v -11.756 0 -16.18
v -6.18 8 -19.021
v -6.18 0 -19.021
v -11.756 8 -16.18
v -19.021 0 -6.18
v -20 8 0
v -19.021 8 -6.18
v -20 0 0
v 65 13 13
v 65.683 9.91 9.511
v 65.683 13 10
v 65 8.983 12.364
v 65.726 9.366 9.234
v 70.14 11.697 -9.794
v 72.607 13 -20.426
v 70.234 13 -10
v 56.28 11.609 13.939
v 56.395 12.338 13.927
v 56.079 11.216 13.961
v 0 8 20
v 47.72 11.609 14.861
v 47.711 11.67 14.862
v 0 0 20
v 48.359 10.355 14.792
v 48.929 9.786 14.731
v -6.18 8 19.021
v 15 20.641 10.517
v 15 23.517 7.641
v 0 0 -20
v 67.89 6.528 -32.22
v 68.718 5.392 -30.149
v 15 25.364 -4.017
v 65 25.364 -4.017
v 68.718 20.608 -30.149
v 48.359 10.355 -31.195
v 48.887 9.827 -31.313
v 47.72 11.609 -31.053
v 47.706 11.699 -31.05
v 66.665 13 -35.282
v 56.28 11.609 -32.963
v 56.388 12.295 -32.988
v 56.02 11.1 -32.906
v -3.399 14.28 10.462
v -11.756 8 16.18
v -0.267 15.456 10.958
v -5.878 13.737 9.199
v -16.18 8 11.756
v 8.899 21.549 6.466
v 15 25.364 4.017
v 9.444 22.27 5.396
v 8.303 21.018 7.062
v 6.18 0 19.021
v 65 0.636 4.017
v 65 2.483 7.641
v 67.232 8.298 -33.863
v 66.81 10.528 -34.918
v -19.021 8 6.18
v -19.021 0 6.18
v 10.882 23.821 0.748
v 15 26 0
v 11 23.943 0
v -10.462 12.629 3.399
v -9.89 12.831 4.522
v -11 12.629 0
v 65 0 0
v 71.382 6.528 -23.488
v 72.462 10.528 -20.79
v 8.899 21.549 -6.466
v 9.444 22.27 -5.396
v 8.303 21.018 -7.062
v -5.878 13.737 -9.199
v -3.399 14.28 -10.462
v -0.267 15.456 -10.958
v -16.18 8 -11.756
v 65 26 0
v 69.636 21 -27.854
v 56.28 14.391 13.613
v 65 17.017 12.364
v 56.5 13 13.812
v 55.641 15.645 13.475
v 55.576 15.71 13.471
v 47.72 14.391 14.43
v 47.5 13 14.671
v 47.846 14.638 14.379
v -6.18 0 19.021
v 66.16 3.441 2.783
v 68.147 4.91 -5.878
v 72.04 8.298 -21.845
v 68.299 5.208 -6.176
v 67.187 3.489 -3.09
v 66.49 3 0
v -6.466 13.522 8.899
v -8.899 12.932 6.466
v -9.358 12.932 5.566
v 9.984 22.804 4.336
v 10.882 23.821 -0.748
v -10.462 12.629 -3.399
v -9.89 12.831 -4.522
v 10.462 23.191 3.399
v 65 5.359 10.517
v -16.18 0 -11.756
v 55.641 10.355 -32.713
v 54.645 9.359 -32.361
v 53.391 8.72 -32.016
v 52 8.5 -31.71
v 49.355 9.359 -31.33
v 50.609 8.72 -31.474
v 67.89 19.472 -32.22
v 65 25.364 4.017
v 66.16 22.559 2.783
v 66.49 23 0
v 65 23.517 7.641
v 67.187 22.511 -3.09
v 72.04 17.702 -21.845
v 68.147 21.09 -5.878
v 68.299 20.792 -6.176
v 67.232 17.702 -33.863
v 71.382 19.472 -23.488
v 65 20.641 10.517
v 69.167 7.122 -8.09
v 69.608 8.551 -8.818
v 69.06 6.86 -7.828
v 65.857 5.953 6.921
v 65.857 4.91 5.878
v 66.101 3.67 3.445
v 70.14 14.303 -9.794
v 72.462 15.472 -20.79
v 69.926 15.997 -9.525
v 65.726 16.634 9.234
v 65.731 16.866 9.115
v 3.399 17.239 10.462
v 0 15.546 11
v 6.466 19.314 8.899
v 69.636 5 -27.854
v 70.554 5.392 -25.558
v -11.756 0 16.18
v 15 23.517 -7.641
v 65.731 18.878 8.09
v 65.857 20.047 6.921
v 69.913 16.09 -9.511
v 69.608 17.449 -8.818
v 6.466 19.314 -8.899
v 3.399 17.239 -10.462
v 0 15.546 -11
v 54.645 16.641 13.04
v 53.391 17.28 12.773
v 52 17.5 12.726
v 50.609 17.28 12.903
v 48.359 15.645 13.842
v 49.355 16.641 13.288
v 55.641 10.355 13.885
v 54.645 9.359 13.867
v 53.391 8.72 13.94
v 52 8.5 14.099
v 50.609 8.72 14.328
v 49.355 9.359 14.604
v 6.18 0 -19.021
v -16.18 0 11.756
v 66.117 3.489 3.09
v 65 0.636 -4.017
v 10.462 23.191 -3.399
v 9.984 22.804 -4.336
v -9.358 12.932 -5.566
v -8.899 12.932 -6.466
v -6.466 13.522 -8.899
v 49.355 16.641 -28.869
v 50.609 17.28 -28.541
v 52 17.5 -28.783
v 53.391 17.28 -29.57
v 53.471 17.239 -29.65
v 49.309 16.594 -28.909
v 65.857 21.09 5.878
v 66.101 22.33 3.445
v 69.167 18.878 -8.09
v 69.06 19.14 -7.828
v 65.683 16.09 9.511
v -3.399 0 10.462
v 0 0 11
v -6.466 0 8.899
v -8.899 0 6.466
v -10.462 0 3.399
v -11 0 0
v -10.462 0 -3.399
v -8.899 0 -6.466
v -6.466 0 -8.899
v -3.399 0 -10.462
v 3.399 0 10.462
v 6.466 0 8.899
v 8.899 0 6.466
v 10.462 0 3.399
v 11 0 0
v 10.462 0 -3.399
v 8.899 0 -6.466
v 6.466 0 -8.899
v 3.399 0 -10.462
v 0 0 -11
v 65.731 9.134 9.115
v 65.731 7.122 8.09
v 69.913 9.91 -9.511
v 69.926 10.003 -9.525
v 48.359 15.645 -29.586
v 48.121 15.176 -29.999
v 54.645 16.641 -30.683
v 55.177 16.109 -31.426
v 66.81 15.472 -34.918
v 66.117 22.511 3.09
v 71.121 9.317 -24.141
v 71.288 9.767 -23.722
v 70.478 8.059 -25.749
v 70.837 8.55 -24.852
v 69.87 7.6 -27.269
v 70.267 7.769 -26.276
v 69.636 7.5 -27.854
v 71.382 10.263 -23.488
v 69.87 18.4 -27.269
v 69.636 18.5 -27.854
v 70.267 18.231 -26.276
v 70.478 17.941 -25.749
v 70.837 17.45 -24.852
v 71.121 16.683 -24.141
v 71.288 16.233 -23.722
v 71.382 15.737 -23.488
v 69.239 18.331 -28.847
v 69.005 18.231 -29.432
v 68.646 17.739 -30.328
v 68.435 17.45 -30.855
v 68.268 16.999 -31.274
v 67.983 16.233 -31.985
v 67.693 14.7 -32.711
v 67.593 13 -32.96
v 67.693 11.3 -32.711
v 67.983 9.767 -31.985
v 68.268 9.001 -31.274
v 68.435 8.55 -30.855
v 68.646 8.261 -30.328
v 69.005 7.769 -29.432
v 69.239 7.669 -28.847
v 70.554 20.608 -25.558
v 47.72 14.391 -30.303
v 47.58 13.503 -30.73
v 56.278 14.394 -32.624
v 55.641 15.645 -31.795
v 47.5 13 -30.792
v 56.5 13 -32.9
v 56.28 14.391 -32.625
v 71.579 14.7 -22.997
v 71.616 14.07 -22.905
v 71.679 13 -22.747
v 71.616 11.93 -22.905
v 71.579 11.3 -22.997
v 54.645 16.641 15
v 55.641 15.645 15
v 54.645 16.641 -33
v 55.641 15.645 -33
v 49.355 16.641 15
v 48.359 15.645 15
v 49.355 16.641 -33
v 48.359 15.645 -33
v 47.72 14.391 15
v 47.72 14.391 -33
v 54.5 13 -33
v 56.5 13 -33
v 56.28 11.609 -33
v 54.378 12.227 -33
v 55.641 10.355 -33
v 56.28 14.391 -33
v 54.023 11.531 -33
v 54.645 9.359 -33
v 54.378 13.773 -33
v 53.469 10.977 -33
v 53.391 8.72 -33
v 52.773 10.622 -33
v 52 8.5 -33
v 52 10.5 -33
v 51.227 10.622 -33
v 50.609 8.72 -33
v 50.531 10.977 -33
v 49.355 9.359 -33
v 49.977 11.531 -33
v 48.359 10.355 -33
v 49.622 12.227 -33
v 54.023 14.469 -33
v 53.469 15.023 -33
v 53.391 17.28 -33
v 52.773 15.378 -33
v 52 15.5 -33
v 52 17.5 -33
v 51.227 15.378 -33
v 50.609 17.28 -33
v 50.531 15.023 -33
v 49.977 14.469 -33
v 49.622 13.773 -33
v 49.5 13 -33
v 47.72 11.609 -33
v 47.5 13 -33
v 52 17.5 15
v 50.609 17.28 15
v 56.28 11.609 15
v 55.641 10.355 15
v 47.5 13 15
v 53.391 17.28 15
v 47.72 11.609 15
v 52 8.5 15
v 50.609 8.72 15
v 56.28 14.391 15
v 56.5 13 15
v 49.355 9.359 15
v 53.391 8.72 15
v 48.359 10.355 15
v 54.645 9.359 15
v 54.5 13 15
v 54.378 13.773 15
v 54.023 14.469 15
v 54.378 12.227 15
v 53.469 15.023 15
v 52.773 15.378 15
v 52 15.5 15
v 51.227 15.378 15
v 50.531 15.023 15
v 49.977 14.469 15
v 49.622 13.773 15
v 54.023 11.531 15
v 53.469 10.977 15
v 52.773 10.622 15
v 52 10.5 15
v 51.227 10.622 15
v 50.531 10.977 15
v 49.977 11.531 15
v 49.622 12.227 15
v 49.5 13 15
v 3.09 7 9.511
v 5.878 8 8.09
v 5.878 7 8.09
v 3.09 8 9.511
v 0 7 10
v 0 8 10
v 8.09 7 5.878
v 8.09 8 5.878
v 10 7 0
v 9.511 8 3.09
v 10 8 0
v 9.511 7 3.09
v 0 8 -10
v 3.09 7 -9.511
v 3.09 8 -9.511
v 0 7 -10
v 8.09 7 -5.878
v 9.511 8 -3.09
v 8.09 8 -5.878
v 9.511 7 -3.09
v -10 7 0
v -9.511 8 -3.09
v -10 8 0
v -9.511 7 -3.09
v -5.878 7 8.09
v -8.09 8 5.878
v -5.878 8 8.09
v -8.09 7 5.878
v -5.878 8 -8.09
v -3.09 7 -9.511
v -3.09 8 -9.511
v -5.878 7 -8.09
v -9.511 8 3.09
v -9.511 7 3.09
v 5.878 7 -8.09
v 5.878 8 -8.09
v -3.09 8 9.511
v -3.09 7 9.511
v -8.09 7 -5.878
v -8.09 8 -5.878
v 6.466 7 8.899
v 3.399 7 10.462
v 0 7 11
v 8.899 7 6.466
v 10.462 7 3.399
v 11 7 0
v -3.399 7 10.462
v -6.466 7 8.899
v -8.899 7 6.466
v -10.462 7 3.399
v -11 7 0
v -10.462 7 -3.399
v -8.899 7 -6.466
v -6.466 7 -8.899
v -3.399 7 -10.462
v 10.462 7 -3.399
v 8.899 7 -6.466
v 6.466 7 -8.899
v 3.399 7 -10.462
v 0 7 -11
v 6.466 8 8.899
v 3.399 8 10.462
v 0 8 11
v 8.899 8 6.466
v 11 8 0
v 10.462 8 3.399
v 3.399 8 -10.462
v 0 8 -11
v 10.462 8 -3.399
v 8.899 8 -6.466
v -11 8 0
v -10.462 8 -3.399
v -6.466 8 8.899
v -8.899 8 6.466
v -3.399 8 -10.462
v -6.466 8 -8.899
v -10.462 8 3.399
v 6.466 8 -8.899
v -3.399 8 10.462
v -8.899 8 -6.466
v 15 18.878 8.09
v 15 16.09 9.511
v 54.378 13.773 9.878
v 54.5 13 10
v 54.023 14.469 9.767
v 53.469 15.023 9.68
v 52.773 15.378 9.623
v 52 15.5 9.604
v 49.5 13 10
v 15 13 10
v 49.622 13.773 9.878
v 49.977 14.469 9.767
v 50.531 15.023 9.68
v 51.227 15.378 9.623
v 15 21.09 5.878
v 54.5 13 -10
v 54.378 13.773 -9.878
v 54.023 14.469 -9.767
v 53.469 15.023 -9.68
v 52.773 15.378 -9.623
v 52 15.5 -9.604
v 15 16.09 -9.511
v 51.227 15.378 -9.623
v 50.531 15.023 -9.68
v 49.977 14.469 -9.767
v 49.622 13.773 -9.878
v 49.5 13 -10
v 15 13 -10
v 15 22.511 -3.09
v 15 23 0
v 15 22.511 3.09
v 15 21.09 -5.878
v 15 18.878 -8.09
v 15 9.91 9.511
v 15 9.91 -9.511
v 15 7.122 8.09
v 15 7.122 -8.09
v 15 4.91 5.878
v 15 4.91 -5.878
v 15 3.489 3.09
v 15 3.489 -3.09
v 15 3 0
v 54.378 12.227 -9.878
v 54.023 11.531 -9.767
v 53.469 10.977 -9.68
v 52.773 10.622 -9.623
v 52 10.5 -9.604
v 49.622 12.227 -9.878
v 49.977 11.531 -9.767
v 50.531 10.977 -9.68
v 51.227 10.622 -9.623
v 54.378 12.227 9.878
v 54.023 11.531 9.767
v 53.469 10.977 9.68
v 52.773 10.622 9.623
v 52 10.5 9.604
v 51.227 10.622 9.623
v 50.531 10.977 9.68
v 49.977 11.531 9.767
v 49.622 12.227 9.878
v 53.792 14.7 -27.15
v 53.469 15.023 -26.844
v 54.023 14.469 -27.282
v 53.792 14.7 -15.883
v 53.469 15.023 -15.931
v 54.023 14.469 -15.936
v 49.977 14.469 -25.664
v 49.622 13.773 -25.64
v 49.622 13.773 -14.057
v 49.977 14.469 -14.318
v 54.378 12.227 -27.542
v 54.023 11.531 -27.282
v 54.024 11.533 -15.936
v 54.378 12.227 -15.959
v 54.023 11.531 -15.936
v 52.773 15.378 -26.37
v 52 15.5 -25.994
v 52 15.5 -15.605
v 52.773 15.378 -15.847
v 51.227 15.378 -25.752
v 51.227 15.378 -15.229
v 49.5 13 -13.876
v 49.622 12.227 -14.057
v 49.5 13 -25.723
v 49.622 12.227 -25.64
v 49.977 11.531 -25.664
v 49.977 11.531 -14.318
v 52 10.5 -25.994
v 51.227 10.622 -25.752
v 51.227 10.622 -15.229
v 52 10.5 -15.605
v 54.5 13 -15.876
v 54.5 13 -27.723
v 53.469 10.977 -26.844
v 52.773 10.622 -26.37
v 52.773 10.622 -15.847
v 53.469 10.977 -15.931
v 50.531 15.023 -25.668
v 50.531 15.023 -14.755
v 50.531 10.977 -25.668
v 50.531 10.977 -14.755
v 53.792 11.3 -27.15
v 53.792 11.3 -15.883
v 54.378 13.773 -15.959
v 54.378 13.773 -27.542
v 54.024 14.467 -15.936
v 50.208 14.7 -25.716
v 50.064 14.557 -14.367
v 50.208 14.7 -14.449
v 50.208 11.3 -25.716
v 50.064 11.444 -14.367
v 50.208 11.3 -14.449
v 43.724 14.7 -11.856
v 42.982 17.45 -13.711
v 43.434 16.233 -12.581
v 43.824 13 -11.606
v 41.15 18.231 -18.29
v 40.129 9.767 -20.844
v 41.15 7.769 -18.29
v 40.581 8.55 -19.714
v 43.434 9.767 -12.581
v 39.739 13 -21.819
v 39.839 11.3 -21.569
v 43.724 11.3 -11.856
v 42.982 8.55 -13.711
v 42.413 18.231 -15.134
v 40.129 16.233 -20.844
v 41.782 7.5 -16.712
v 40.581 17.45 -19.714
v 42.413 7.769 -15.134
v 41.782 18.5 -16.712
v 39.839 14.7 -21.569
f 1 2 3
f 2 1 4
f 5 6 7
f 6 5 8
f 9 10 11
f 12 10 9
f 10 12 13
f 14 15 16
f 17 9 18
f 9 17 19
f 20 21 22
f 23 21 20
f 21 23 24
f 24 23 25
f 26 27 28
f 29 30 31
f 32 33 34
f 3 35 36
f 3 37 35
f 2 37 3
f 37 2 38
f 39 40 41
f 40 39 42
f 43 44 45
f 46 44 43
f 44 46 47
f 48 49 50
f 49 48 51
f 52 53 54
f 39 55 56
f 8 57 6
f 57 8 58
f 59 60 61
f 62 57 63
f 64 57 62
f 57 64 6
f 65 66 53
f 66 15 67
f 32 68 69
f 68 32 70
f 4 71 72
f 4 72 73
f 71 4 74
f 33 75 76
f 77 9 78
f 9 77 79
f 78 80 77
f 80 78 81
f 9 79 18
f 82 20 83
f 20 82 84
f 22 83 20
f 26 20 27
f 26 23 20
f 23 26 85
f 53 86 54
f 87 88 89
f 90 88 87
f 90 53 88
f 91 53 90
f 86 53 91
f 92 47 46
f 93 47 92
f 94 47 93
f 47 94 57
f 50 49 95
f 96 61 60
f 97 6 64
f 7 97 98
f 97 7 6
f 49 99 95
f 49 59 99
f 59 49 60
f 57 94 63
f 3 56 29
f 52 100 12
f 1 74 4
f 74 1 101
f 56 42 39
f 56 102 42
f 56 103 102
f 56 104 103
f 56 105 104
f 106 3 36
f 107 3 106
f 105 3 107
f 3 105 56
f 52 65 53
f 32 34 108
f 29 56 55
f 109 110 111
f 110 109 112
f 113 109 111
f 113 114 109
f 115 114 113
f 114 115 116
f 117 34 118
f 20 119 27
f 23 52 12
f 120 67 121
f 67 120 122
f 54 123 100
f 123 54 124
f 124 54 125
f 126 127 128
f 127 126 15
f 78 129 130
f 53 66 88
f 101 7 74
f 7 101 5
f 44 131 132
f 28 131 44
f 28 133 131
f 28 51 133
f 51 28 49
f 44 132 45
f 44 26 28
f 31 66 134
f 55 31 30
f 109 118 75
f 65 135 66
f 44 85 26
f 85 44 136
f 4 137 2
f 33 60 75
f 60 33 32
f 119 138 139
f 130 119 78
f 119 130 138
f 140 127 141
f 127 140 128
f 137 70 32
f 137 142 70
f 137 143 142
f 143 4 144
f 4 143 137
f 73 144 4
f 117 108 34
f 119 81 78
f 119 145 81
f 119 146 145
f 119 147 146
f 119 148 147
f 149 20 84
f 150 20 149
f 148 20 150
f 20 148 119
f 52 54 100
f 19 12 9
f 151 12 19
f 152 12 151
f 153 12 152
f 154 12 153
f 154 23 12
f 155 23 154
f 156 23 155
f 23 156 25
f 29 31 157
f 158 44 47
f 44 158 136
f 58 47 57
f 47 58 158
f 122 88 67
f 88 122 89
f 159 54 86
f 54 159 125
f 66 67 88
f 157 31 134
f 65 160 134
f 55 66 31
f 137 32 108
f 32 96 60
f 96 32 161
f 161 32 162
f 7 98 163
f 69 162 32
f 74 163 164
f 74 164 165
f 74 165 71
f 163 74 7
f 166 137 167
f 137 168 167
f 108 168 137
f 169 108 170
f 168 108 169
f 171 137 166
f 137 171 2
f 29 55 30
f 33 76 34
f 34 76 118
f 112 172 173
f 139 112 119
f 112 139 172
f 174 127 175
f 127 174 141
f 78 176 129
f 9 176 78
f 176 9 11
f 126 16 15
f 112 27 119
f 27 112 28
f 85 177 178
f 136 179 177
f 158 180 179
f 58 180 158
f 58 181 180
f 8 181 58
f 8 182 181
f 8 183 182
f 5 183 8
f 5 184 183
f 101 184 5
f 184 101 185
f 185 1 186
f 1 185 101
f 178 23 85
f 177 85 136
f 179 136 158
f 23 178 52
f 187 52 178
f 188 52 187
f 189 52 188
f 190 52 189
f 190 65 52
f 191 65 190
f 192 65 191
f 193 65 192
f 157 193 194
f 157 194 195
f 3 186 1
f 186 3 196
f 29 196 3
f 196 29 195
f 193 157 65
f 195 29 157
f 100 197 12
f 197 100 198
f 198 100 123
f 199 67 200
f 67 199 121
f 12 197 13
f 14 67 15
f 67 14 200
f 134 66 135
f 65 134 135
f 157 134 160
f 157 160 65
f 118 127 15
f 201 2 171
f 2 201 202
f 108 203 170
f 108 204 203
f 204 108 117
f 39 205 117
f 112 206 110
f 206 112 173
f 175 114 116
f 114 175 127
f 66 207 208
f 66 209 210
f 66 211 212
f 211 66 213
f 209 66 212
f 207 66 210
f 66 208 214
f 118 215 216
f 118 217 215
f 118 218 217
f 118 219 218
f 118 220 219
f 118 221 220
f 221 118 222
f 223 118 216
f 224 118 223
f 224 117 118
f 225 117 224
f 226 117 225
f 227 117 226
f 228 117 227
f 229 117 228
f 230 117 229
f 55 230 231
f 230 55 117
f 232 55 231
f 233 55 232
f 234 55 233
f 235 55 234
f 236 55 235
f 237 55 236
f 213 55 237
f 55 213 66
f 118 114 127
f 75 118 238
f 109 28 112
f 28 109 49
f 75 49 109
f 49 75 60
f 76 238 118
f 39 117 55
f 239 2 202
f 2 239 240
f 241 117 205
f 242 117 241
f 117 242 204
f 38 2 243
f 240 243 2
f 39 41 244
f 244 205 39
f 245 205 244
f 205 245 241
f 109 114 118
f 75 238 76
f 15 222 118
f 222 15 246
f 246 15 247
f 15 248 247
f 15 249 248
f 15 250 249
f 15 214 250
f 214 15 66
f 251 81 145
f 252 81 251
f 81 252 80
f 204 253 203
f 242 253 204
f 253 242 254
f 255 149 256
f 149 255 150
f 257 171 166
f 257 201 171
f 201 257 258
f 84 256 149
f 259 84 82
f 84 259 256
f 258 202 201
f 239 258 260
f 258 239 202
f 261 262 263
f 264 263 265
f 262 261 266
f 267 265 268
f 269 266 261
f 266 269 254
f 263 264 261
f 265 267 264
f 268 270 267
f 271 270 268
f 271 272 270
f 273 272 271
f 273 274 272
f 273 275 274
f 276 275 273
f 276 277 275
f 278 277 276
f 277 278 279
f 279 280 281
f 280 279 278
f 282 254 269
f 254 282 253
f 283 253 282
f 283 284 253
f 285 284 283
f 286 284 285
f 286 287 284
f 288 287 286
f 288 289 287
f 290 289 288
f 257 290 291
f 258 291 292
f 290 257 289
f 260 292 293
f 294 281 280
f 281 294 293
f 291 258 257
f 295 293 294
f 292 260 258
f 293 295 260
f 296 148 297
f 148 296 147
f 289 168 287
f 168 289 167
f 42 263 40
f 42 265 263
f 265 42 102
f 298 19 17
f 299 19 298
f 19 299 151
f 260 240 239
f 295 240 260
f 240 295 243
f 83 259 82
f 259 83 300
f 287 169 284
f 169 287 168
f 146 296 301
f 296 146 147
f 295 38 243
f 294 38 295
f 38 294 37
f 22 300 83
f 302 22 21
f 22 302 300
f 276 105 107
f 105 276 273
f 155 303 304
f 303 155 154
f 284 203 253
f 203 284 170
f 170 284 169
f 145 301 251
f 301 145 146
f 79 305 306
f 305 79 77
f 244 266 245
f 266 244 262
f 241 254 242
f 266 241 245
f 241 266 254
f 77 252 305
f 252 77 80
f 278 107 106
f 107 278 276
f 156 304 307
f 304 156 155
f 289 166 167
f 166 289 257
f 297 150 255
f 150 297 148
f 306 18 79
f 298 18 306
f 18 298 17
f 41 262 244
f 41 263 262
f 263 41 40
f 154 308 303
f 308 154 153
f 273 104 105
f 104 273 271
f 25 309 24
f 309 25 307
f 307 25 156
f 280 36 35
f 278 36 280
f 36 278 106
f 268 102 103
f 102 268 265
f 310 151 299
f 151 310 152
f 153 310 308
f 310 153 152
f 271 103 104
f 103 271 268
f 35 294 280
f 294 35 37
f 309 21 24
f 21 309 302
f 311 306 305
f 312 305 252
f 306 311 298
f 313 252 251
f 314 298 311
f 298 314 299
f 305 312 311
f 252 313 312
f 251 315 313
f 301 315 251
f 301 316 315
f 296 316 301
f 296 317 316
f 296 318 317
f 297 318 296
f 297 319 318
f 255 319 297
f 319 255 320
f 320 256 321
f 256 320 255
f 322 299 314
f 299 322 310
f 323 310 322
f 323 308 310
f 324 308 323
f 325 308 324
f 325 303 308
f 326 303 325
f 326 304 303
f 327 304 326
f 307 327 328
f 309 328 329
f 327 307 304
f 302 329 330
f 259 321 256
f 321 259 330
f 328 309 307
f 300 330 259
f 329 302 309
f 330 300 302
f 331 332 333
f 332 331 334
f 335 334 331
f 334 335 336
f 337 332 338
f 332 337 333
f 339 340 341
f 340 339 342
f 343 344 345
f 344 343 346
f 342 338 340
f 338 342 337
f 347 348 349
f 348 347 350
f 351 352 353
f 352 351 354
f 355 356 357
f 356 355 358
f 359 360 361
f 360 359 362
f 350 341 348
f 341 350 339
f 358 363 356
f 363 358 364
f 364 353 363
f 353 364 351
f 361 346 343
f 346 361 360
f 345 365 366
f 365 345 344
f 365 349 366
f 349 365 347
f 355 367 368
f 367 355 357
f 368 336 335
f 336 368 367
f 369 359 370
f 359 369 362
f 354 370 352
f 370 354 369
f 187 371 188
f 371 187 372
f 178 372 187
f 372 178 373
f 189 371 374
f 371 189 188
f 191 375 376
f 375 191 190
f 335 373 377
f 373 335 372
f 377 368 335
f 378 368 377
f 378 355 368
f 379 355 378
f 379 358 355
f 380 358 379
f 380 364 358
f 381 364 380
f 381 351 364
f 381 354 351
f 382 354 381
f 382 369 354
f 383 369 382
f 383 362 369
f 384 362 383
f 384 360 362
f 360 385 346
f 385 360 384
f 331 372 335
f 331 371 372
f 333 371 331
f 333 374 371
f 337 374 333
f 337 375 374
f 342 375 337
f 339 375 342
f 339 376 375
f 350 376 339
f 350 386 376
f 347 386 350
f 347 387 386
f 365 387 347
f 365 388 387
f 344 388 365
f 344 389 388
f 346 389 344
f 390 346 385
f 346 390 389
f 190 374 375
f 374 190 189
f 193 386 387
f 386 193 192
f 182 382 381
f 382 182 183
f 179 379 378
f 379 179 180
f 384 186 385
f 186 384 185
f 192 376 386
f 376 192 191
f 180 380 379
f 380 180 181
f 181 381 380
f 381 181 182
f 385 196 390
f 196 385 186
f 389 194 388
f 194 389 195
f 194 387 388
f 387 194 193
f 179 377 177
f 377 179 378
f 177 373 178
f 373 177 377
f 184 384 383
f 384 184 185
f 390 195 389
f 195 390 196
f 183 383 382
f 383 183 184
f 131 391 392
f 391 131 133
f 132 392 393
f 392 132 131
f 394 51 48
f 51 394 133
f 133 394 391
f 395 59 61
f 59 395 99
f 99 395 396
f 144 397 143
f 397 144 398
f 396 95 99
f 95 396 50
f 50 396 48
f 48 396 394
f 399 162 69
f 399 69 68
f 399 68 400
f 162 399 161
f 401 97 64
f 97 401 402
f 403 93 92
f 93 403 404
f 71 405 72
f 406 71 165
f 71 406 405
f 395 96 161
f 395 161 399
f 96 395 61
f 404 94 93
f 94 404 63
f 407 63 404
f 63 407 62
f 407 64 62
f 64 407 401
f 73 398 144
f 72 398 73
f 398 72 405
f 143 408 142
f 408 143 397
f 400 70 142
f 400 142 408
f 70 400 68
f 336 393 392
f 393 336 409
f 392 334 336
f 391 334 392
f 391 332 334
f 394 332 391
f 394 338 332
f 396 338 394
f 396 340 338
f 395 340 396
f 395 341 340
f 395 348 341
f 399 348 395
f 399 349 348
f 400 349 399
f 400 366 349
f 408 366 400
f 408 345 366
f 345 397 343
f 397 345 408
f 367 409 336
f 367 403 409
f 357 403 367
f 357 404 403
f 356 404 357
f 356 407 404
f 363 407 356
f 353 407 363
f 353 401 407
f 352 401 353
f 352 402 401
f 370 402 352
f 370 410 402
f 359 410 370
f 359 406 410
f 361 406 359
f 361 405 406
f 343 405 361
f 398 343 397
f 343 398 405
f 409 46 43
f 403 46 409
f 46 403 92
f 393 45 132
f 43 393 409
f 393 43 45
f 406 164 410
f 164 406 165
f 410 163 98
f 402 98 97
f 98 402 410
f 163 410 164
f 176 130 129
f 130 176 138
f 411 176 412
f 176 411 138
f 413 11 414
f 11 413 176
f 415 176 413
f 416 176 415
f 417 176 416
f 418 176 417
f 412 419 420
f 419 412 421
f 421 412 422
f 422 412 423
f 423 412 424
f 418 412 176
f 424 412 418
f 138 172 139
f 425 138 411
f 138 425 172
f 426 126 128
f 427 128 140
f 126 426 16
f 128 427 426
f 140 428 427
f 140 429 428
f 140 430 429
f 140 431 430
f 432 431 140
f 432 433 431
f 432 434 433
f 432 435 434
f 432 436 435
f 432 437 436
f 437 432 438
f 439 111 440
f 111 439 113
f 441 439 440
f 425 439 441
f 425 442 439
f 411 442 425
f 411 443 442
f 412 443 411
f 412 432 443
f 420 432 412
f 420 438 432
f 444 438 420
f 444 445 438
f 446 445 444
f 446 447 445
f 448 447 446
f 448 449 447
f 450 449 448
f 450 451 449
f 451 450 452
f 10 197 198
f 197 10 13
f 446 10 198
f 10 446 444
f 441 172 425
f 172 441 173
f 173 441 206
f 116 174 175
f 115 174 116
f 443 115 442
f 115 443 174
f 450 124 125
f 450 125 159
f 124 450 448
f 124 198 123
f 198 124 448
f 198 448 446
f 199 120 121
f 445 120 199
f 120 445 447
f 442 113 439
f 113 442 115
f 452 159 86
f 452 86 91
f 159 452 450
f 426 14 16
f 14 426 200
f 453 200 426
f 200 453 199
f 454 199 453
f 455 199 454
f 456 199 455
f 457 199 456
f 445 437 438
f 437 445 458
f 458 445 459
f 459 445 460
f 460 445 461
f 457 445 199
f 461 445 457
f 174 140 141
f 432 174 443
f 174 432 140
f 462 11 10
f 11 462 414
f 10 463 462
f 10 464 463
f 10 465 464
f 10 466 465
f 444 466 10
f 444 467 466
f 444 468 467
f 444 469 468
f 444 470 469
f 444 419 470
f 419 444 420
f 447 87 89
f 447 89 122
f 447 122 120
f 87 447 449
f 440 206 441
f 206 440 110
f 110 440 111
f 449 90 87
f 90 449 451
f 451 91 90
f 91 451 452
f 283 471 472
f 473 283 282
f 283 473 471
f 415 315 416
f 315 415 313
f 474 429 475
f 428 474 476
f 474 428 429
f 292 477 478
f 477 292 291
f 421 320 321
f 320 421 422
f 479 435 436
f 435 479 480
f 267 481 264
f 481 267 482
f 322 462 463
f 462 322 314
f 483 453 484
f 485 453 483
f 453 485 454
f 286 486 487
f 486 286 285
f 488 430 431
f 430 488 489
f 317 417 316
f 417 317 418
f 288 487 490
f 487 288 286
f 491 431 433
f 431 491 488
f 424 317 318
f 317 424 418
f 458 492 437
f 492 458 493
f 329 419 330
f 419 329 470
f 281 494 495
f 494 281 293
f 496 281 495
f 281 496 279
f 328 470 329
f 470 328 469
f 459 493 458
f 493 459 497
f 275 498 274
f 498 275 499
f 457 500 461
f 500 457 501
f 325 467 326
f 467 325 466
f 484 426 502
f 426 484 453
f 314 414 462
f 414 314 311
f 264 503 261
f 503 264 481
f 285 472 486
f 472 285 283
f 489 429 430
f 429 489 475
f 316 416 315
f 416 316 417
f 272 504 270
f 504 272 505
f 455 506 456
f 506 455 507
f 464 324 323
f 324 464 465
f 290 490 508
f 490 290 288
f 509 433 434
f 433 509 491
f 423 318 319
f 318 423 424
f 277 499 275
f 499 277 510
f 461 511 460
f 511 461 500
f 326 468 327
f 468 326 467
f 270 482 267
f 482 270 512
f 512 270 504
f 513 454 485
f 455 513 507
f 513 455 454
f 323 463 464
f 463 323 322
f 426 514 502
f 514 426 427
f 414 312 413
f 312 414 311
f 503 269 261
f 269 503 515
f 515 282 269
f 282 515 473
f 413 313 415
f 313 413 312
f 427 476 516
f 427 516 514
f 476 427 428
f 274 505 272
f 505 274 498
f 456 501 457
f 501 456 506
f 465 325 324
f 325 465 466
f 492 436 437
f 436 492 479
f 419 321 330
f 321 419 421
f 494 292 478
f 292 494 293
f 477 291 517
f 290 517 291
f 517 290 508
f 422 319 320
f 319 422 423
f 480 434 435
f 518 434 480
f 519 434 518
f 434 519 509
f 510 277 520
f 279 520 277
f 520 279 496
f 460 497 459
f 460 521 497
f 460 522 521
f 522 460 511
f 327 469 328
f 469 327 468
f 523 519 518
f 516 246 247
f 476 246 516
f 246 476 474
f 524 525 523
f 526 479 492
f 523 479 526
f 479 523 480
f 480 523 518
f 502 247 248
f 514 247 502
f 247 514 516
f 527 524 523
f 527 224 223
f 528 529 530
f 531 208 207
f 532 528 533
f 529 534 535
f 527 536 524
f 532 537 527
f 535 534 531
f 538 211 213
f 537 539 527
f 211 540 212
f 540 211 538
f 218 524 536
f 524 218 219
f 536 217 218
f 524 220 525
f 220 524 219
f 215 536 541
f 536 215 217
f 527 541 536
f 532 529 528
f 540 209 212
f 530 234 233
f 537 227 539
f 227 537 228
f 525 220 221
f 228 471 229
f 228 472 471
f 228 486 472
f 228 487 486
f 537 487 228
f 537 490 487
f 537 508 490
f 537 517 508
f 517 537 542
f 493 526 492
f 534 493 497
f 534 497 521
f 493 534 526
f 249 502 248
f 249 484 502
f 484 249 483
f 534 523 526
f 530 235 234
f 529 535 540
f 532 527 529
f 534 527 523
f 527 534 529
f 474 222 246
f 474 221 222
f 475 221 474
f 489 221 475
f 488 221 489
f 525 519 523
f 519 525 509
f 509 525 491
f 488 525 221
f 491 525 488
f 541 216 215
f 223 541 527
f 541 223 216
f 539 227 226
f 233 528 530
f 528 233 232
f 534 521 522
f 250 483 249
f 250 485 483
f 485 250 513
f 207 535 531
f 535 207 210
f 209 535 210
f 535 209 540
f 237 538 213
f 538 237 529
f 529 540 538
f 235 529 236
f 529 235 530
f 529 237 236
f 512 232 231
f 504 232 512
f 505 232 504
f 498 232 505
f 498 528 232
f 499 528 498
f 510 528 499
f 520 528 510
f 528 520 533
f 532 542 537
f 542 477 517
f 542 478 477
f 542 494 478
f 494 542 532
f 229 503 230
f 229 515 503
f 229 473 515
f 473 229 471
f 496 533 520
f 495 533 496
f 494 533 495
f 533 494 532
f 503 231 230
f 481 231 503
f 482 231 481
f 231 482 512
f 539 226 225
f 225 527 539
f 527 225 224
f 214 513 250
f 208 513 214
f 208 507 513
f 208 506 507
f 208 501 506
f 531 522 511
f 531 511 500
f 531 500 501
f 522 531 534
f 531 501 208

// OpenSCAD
$fn=20;
mirror([0, 0, 1]) rotate([-90, 0, 0]) 
translate([0, 0, 26]) rotate([0, 180, -90]) difference()
{
    union()
    {
        hull()
        {
            translate([0, 0, 18]) cylinder(d=40, h=8);
            translate([0, 15, 13]) rotate([-90, 0, 0])           cylinder(d=26, h=50);
            rotate([0, 0, 21.801]) translate([0, 40, 0]) hull()
            {
                translate([0, 35, 13]) rotate([90, 0, 0])           cylinder(d=16, h=20);
            }
        }
        
        
        translate([-33, 52, 13]) rotate([0, 90, 0]) cylinder(d=9, h=48);
        
    }
    translate([0, 0, 0]) cylinder(d=20, h=40);
    translate([0, 0, 19]) cylinder(d=22, h=10);
    translate([0, 0, 0]) cylinder(d=22, h=18);//na wys 15 
    translate([0, 15, 13]) rotate([-90, 0, 0])        cylinder(d=20, h=81);
    translate([-34, 52, 13]) rotate([0, 90, 0]) cylinder(d=5, h=50);
    
    rotate([0, 0, 21.801]) translate([0, 45, 13]) rotate([-90, 0, 0])        cylinder(d=11, h=81);
    
}
